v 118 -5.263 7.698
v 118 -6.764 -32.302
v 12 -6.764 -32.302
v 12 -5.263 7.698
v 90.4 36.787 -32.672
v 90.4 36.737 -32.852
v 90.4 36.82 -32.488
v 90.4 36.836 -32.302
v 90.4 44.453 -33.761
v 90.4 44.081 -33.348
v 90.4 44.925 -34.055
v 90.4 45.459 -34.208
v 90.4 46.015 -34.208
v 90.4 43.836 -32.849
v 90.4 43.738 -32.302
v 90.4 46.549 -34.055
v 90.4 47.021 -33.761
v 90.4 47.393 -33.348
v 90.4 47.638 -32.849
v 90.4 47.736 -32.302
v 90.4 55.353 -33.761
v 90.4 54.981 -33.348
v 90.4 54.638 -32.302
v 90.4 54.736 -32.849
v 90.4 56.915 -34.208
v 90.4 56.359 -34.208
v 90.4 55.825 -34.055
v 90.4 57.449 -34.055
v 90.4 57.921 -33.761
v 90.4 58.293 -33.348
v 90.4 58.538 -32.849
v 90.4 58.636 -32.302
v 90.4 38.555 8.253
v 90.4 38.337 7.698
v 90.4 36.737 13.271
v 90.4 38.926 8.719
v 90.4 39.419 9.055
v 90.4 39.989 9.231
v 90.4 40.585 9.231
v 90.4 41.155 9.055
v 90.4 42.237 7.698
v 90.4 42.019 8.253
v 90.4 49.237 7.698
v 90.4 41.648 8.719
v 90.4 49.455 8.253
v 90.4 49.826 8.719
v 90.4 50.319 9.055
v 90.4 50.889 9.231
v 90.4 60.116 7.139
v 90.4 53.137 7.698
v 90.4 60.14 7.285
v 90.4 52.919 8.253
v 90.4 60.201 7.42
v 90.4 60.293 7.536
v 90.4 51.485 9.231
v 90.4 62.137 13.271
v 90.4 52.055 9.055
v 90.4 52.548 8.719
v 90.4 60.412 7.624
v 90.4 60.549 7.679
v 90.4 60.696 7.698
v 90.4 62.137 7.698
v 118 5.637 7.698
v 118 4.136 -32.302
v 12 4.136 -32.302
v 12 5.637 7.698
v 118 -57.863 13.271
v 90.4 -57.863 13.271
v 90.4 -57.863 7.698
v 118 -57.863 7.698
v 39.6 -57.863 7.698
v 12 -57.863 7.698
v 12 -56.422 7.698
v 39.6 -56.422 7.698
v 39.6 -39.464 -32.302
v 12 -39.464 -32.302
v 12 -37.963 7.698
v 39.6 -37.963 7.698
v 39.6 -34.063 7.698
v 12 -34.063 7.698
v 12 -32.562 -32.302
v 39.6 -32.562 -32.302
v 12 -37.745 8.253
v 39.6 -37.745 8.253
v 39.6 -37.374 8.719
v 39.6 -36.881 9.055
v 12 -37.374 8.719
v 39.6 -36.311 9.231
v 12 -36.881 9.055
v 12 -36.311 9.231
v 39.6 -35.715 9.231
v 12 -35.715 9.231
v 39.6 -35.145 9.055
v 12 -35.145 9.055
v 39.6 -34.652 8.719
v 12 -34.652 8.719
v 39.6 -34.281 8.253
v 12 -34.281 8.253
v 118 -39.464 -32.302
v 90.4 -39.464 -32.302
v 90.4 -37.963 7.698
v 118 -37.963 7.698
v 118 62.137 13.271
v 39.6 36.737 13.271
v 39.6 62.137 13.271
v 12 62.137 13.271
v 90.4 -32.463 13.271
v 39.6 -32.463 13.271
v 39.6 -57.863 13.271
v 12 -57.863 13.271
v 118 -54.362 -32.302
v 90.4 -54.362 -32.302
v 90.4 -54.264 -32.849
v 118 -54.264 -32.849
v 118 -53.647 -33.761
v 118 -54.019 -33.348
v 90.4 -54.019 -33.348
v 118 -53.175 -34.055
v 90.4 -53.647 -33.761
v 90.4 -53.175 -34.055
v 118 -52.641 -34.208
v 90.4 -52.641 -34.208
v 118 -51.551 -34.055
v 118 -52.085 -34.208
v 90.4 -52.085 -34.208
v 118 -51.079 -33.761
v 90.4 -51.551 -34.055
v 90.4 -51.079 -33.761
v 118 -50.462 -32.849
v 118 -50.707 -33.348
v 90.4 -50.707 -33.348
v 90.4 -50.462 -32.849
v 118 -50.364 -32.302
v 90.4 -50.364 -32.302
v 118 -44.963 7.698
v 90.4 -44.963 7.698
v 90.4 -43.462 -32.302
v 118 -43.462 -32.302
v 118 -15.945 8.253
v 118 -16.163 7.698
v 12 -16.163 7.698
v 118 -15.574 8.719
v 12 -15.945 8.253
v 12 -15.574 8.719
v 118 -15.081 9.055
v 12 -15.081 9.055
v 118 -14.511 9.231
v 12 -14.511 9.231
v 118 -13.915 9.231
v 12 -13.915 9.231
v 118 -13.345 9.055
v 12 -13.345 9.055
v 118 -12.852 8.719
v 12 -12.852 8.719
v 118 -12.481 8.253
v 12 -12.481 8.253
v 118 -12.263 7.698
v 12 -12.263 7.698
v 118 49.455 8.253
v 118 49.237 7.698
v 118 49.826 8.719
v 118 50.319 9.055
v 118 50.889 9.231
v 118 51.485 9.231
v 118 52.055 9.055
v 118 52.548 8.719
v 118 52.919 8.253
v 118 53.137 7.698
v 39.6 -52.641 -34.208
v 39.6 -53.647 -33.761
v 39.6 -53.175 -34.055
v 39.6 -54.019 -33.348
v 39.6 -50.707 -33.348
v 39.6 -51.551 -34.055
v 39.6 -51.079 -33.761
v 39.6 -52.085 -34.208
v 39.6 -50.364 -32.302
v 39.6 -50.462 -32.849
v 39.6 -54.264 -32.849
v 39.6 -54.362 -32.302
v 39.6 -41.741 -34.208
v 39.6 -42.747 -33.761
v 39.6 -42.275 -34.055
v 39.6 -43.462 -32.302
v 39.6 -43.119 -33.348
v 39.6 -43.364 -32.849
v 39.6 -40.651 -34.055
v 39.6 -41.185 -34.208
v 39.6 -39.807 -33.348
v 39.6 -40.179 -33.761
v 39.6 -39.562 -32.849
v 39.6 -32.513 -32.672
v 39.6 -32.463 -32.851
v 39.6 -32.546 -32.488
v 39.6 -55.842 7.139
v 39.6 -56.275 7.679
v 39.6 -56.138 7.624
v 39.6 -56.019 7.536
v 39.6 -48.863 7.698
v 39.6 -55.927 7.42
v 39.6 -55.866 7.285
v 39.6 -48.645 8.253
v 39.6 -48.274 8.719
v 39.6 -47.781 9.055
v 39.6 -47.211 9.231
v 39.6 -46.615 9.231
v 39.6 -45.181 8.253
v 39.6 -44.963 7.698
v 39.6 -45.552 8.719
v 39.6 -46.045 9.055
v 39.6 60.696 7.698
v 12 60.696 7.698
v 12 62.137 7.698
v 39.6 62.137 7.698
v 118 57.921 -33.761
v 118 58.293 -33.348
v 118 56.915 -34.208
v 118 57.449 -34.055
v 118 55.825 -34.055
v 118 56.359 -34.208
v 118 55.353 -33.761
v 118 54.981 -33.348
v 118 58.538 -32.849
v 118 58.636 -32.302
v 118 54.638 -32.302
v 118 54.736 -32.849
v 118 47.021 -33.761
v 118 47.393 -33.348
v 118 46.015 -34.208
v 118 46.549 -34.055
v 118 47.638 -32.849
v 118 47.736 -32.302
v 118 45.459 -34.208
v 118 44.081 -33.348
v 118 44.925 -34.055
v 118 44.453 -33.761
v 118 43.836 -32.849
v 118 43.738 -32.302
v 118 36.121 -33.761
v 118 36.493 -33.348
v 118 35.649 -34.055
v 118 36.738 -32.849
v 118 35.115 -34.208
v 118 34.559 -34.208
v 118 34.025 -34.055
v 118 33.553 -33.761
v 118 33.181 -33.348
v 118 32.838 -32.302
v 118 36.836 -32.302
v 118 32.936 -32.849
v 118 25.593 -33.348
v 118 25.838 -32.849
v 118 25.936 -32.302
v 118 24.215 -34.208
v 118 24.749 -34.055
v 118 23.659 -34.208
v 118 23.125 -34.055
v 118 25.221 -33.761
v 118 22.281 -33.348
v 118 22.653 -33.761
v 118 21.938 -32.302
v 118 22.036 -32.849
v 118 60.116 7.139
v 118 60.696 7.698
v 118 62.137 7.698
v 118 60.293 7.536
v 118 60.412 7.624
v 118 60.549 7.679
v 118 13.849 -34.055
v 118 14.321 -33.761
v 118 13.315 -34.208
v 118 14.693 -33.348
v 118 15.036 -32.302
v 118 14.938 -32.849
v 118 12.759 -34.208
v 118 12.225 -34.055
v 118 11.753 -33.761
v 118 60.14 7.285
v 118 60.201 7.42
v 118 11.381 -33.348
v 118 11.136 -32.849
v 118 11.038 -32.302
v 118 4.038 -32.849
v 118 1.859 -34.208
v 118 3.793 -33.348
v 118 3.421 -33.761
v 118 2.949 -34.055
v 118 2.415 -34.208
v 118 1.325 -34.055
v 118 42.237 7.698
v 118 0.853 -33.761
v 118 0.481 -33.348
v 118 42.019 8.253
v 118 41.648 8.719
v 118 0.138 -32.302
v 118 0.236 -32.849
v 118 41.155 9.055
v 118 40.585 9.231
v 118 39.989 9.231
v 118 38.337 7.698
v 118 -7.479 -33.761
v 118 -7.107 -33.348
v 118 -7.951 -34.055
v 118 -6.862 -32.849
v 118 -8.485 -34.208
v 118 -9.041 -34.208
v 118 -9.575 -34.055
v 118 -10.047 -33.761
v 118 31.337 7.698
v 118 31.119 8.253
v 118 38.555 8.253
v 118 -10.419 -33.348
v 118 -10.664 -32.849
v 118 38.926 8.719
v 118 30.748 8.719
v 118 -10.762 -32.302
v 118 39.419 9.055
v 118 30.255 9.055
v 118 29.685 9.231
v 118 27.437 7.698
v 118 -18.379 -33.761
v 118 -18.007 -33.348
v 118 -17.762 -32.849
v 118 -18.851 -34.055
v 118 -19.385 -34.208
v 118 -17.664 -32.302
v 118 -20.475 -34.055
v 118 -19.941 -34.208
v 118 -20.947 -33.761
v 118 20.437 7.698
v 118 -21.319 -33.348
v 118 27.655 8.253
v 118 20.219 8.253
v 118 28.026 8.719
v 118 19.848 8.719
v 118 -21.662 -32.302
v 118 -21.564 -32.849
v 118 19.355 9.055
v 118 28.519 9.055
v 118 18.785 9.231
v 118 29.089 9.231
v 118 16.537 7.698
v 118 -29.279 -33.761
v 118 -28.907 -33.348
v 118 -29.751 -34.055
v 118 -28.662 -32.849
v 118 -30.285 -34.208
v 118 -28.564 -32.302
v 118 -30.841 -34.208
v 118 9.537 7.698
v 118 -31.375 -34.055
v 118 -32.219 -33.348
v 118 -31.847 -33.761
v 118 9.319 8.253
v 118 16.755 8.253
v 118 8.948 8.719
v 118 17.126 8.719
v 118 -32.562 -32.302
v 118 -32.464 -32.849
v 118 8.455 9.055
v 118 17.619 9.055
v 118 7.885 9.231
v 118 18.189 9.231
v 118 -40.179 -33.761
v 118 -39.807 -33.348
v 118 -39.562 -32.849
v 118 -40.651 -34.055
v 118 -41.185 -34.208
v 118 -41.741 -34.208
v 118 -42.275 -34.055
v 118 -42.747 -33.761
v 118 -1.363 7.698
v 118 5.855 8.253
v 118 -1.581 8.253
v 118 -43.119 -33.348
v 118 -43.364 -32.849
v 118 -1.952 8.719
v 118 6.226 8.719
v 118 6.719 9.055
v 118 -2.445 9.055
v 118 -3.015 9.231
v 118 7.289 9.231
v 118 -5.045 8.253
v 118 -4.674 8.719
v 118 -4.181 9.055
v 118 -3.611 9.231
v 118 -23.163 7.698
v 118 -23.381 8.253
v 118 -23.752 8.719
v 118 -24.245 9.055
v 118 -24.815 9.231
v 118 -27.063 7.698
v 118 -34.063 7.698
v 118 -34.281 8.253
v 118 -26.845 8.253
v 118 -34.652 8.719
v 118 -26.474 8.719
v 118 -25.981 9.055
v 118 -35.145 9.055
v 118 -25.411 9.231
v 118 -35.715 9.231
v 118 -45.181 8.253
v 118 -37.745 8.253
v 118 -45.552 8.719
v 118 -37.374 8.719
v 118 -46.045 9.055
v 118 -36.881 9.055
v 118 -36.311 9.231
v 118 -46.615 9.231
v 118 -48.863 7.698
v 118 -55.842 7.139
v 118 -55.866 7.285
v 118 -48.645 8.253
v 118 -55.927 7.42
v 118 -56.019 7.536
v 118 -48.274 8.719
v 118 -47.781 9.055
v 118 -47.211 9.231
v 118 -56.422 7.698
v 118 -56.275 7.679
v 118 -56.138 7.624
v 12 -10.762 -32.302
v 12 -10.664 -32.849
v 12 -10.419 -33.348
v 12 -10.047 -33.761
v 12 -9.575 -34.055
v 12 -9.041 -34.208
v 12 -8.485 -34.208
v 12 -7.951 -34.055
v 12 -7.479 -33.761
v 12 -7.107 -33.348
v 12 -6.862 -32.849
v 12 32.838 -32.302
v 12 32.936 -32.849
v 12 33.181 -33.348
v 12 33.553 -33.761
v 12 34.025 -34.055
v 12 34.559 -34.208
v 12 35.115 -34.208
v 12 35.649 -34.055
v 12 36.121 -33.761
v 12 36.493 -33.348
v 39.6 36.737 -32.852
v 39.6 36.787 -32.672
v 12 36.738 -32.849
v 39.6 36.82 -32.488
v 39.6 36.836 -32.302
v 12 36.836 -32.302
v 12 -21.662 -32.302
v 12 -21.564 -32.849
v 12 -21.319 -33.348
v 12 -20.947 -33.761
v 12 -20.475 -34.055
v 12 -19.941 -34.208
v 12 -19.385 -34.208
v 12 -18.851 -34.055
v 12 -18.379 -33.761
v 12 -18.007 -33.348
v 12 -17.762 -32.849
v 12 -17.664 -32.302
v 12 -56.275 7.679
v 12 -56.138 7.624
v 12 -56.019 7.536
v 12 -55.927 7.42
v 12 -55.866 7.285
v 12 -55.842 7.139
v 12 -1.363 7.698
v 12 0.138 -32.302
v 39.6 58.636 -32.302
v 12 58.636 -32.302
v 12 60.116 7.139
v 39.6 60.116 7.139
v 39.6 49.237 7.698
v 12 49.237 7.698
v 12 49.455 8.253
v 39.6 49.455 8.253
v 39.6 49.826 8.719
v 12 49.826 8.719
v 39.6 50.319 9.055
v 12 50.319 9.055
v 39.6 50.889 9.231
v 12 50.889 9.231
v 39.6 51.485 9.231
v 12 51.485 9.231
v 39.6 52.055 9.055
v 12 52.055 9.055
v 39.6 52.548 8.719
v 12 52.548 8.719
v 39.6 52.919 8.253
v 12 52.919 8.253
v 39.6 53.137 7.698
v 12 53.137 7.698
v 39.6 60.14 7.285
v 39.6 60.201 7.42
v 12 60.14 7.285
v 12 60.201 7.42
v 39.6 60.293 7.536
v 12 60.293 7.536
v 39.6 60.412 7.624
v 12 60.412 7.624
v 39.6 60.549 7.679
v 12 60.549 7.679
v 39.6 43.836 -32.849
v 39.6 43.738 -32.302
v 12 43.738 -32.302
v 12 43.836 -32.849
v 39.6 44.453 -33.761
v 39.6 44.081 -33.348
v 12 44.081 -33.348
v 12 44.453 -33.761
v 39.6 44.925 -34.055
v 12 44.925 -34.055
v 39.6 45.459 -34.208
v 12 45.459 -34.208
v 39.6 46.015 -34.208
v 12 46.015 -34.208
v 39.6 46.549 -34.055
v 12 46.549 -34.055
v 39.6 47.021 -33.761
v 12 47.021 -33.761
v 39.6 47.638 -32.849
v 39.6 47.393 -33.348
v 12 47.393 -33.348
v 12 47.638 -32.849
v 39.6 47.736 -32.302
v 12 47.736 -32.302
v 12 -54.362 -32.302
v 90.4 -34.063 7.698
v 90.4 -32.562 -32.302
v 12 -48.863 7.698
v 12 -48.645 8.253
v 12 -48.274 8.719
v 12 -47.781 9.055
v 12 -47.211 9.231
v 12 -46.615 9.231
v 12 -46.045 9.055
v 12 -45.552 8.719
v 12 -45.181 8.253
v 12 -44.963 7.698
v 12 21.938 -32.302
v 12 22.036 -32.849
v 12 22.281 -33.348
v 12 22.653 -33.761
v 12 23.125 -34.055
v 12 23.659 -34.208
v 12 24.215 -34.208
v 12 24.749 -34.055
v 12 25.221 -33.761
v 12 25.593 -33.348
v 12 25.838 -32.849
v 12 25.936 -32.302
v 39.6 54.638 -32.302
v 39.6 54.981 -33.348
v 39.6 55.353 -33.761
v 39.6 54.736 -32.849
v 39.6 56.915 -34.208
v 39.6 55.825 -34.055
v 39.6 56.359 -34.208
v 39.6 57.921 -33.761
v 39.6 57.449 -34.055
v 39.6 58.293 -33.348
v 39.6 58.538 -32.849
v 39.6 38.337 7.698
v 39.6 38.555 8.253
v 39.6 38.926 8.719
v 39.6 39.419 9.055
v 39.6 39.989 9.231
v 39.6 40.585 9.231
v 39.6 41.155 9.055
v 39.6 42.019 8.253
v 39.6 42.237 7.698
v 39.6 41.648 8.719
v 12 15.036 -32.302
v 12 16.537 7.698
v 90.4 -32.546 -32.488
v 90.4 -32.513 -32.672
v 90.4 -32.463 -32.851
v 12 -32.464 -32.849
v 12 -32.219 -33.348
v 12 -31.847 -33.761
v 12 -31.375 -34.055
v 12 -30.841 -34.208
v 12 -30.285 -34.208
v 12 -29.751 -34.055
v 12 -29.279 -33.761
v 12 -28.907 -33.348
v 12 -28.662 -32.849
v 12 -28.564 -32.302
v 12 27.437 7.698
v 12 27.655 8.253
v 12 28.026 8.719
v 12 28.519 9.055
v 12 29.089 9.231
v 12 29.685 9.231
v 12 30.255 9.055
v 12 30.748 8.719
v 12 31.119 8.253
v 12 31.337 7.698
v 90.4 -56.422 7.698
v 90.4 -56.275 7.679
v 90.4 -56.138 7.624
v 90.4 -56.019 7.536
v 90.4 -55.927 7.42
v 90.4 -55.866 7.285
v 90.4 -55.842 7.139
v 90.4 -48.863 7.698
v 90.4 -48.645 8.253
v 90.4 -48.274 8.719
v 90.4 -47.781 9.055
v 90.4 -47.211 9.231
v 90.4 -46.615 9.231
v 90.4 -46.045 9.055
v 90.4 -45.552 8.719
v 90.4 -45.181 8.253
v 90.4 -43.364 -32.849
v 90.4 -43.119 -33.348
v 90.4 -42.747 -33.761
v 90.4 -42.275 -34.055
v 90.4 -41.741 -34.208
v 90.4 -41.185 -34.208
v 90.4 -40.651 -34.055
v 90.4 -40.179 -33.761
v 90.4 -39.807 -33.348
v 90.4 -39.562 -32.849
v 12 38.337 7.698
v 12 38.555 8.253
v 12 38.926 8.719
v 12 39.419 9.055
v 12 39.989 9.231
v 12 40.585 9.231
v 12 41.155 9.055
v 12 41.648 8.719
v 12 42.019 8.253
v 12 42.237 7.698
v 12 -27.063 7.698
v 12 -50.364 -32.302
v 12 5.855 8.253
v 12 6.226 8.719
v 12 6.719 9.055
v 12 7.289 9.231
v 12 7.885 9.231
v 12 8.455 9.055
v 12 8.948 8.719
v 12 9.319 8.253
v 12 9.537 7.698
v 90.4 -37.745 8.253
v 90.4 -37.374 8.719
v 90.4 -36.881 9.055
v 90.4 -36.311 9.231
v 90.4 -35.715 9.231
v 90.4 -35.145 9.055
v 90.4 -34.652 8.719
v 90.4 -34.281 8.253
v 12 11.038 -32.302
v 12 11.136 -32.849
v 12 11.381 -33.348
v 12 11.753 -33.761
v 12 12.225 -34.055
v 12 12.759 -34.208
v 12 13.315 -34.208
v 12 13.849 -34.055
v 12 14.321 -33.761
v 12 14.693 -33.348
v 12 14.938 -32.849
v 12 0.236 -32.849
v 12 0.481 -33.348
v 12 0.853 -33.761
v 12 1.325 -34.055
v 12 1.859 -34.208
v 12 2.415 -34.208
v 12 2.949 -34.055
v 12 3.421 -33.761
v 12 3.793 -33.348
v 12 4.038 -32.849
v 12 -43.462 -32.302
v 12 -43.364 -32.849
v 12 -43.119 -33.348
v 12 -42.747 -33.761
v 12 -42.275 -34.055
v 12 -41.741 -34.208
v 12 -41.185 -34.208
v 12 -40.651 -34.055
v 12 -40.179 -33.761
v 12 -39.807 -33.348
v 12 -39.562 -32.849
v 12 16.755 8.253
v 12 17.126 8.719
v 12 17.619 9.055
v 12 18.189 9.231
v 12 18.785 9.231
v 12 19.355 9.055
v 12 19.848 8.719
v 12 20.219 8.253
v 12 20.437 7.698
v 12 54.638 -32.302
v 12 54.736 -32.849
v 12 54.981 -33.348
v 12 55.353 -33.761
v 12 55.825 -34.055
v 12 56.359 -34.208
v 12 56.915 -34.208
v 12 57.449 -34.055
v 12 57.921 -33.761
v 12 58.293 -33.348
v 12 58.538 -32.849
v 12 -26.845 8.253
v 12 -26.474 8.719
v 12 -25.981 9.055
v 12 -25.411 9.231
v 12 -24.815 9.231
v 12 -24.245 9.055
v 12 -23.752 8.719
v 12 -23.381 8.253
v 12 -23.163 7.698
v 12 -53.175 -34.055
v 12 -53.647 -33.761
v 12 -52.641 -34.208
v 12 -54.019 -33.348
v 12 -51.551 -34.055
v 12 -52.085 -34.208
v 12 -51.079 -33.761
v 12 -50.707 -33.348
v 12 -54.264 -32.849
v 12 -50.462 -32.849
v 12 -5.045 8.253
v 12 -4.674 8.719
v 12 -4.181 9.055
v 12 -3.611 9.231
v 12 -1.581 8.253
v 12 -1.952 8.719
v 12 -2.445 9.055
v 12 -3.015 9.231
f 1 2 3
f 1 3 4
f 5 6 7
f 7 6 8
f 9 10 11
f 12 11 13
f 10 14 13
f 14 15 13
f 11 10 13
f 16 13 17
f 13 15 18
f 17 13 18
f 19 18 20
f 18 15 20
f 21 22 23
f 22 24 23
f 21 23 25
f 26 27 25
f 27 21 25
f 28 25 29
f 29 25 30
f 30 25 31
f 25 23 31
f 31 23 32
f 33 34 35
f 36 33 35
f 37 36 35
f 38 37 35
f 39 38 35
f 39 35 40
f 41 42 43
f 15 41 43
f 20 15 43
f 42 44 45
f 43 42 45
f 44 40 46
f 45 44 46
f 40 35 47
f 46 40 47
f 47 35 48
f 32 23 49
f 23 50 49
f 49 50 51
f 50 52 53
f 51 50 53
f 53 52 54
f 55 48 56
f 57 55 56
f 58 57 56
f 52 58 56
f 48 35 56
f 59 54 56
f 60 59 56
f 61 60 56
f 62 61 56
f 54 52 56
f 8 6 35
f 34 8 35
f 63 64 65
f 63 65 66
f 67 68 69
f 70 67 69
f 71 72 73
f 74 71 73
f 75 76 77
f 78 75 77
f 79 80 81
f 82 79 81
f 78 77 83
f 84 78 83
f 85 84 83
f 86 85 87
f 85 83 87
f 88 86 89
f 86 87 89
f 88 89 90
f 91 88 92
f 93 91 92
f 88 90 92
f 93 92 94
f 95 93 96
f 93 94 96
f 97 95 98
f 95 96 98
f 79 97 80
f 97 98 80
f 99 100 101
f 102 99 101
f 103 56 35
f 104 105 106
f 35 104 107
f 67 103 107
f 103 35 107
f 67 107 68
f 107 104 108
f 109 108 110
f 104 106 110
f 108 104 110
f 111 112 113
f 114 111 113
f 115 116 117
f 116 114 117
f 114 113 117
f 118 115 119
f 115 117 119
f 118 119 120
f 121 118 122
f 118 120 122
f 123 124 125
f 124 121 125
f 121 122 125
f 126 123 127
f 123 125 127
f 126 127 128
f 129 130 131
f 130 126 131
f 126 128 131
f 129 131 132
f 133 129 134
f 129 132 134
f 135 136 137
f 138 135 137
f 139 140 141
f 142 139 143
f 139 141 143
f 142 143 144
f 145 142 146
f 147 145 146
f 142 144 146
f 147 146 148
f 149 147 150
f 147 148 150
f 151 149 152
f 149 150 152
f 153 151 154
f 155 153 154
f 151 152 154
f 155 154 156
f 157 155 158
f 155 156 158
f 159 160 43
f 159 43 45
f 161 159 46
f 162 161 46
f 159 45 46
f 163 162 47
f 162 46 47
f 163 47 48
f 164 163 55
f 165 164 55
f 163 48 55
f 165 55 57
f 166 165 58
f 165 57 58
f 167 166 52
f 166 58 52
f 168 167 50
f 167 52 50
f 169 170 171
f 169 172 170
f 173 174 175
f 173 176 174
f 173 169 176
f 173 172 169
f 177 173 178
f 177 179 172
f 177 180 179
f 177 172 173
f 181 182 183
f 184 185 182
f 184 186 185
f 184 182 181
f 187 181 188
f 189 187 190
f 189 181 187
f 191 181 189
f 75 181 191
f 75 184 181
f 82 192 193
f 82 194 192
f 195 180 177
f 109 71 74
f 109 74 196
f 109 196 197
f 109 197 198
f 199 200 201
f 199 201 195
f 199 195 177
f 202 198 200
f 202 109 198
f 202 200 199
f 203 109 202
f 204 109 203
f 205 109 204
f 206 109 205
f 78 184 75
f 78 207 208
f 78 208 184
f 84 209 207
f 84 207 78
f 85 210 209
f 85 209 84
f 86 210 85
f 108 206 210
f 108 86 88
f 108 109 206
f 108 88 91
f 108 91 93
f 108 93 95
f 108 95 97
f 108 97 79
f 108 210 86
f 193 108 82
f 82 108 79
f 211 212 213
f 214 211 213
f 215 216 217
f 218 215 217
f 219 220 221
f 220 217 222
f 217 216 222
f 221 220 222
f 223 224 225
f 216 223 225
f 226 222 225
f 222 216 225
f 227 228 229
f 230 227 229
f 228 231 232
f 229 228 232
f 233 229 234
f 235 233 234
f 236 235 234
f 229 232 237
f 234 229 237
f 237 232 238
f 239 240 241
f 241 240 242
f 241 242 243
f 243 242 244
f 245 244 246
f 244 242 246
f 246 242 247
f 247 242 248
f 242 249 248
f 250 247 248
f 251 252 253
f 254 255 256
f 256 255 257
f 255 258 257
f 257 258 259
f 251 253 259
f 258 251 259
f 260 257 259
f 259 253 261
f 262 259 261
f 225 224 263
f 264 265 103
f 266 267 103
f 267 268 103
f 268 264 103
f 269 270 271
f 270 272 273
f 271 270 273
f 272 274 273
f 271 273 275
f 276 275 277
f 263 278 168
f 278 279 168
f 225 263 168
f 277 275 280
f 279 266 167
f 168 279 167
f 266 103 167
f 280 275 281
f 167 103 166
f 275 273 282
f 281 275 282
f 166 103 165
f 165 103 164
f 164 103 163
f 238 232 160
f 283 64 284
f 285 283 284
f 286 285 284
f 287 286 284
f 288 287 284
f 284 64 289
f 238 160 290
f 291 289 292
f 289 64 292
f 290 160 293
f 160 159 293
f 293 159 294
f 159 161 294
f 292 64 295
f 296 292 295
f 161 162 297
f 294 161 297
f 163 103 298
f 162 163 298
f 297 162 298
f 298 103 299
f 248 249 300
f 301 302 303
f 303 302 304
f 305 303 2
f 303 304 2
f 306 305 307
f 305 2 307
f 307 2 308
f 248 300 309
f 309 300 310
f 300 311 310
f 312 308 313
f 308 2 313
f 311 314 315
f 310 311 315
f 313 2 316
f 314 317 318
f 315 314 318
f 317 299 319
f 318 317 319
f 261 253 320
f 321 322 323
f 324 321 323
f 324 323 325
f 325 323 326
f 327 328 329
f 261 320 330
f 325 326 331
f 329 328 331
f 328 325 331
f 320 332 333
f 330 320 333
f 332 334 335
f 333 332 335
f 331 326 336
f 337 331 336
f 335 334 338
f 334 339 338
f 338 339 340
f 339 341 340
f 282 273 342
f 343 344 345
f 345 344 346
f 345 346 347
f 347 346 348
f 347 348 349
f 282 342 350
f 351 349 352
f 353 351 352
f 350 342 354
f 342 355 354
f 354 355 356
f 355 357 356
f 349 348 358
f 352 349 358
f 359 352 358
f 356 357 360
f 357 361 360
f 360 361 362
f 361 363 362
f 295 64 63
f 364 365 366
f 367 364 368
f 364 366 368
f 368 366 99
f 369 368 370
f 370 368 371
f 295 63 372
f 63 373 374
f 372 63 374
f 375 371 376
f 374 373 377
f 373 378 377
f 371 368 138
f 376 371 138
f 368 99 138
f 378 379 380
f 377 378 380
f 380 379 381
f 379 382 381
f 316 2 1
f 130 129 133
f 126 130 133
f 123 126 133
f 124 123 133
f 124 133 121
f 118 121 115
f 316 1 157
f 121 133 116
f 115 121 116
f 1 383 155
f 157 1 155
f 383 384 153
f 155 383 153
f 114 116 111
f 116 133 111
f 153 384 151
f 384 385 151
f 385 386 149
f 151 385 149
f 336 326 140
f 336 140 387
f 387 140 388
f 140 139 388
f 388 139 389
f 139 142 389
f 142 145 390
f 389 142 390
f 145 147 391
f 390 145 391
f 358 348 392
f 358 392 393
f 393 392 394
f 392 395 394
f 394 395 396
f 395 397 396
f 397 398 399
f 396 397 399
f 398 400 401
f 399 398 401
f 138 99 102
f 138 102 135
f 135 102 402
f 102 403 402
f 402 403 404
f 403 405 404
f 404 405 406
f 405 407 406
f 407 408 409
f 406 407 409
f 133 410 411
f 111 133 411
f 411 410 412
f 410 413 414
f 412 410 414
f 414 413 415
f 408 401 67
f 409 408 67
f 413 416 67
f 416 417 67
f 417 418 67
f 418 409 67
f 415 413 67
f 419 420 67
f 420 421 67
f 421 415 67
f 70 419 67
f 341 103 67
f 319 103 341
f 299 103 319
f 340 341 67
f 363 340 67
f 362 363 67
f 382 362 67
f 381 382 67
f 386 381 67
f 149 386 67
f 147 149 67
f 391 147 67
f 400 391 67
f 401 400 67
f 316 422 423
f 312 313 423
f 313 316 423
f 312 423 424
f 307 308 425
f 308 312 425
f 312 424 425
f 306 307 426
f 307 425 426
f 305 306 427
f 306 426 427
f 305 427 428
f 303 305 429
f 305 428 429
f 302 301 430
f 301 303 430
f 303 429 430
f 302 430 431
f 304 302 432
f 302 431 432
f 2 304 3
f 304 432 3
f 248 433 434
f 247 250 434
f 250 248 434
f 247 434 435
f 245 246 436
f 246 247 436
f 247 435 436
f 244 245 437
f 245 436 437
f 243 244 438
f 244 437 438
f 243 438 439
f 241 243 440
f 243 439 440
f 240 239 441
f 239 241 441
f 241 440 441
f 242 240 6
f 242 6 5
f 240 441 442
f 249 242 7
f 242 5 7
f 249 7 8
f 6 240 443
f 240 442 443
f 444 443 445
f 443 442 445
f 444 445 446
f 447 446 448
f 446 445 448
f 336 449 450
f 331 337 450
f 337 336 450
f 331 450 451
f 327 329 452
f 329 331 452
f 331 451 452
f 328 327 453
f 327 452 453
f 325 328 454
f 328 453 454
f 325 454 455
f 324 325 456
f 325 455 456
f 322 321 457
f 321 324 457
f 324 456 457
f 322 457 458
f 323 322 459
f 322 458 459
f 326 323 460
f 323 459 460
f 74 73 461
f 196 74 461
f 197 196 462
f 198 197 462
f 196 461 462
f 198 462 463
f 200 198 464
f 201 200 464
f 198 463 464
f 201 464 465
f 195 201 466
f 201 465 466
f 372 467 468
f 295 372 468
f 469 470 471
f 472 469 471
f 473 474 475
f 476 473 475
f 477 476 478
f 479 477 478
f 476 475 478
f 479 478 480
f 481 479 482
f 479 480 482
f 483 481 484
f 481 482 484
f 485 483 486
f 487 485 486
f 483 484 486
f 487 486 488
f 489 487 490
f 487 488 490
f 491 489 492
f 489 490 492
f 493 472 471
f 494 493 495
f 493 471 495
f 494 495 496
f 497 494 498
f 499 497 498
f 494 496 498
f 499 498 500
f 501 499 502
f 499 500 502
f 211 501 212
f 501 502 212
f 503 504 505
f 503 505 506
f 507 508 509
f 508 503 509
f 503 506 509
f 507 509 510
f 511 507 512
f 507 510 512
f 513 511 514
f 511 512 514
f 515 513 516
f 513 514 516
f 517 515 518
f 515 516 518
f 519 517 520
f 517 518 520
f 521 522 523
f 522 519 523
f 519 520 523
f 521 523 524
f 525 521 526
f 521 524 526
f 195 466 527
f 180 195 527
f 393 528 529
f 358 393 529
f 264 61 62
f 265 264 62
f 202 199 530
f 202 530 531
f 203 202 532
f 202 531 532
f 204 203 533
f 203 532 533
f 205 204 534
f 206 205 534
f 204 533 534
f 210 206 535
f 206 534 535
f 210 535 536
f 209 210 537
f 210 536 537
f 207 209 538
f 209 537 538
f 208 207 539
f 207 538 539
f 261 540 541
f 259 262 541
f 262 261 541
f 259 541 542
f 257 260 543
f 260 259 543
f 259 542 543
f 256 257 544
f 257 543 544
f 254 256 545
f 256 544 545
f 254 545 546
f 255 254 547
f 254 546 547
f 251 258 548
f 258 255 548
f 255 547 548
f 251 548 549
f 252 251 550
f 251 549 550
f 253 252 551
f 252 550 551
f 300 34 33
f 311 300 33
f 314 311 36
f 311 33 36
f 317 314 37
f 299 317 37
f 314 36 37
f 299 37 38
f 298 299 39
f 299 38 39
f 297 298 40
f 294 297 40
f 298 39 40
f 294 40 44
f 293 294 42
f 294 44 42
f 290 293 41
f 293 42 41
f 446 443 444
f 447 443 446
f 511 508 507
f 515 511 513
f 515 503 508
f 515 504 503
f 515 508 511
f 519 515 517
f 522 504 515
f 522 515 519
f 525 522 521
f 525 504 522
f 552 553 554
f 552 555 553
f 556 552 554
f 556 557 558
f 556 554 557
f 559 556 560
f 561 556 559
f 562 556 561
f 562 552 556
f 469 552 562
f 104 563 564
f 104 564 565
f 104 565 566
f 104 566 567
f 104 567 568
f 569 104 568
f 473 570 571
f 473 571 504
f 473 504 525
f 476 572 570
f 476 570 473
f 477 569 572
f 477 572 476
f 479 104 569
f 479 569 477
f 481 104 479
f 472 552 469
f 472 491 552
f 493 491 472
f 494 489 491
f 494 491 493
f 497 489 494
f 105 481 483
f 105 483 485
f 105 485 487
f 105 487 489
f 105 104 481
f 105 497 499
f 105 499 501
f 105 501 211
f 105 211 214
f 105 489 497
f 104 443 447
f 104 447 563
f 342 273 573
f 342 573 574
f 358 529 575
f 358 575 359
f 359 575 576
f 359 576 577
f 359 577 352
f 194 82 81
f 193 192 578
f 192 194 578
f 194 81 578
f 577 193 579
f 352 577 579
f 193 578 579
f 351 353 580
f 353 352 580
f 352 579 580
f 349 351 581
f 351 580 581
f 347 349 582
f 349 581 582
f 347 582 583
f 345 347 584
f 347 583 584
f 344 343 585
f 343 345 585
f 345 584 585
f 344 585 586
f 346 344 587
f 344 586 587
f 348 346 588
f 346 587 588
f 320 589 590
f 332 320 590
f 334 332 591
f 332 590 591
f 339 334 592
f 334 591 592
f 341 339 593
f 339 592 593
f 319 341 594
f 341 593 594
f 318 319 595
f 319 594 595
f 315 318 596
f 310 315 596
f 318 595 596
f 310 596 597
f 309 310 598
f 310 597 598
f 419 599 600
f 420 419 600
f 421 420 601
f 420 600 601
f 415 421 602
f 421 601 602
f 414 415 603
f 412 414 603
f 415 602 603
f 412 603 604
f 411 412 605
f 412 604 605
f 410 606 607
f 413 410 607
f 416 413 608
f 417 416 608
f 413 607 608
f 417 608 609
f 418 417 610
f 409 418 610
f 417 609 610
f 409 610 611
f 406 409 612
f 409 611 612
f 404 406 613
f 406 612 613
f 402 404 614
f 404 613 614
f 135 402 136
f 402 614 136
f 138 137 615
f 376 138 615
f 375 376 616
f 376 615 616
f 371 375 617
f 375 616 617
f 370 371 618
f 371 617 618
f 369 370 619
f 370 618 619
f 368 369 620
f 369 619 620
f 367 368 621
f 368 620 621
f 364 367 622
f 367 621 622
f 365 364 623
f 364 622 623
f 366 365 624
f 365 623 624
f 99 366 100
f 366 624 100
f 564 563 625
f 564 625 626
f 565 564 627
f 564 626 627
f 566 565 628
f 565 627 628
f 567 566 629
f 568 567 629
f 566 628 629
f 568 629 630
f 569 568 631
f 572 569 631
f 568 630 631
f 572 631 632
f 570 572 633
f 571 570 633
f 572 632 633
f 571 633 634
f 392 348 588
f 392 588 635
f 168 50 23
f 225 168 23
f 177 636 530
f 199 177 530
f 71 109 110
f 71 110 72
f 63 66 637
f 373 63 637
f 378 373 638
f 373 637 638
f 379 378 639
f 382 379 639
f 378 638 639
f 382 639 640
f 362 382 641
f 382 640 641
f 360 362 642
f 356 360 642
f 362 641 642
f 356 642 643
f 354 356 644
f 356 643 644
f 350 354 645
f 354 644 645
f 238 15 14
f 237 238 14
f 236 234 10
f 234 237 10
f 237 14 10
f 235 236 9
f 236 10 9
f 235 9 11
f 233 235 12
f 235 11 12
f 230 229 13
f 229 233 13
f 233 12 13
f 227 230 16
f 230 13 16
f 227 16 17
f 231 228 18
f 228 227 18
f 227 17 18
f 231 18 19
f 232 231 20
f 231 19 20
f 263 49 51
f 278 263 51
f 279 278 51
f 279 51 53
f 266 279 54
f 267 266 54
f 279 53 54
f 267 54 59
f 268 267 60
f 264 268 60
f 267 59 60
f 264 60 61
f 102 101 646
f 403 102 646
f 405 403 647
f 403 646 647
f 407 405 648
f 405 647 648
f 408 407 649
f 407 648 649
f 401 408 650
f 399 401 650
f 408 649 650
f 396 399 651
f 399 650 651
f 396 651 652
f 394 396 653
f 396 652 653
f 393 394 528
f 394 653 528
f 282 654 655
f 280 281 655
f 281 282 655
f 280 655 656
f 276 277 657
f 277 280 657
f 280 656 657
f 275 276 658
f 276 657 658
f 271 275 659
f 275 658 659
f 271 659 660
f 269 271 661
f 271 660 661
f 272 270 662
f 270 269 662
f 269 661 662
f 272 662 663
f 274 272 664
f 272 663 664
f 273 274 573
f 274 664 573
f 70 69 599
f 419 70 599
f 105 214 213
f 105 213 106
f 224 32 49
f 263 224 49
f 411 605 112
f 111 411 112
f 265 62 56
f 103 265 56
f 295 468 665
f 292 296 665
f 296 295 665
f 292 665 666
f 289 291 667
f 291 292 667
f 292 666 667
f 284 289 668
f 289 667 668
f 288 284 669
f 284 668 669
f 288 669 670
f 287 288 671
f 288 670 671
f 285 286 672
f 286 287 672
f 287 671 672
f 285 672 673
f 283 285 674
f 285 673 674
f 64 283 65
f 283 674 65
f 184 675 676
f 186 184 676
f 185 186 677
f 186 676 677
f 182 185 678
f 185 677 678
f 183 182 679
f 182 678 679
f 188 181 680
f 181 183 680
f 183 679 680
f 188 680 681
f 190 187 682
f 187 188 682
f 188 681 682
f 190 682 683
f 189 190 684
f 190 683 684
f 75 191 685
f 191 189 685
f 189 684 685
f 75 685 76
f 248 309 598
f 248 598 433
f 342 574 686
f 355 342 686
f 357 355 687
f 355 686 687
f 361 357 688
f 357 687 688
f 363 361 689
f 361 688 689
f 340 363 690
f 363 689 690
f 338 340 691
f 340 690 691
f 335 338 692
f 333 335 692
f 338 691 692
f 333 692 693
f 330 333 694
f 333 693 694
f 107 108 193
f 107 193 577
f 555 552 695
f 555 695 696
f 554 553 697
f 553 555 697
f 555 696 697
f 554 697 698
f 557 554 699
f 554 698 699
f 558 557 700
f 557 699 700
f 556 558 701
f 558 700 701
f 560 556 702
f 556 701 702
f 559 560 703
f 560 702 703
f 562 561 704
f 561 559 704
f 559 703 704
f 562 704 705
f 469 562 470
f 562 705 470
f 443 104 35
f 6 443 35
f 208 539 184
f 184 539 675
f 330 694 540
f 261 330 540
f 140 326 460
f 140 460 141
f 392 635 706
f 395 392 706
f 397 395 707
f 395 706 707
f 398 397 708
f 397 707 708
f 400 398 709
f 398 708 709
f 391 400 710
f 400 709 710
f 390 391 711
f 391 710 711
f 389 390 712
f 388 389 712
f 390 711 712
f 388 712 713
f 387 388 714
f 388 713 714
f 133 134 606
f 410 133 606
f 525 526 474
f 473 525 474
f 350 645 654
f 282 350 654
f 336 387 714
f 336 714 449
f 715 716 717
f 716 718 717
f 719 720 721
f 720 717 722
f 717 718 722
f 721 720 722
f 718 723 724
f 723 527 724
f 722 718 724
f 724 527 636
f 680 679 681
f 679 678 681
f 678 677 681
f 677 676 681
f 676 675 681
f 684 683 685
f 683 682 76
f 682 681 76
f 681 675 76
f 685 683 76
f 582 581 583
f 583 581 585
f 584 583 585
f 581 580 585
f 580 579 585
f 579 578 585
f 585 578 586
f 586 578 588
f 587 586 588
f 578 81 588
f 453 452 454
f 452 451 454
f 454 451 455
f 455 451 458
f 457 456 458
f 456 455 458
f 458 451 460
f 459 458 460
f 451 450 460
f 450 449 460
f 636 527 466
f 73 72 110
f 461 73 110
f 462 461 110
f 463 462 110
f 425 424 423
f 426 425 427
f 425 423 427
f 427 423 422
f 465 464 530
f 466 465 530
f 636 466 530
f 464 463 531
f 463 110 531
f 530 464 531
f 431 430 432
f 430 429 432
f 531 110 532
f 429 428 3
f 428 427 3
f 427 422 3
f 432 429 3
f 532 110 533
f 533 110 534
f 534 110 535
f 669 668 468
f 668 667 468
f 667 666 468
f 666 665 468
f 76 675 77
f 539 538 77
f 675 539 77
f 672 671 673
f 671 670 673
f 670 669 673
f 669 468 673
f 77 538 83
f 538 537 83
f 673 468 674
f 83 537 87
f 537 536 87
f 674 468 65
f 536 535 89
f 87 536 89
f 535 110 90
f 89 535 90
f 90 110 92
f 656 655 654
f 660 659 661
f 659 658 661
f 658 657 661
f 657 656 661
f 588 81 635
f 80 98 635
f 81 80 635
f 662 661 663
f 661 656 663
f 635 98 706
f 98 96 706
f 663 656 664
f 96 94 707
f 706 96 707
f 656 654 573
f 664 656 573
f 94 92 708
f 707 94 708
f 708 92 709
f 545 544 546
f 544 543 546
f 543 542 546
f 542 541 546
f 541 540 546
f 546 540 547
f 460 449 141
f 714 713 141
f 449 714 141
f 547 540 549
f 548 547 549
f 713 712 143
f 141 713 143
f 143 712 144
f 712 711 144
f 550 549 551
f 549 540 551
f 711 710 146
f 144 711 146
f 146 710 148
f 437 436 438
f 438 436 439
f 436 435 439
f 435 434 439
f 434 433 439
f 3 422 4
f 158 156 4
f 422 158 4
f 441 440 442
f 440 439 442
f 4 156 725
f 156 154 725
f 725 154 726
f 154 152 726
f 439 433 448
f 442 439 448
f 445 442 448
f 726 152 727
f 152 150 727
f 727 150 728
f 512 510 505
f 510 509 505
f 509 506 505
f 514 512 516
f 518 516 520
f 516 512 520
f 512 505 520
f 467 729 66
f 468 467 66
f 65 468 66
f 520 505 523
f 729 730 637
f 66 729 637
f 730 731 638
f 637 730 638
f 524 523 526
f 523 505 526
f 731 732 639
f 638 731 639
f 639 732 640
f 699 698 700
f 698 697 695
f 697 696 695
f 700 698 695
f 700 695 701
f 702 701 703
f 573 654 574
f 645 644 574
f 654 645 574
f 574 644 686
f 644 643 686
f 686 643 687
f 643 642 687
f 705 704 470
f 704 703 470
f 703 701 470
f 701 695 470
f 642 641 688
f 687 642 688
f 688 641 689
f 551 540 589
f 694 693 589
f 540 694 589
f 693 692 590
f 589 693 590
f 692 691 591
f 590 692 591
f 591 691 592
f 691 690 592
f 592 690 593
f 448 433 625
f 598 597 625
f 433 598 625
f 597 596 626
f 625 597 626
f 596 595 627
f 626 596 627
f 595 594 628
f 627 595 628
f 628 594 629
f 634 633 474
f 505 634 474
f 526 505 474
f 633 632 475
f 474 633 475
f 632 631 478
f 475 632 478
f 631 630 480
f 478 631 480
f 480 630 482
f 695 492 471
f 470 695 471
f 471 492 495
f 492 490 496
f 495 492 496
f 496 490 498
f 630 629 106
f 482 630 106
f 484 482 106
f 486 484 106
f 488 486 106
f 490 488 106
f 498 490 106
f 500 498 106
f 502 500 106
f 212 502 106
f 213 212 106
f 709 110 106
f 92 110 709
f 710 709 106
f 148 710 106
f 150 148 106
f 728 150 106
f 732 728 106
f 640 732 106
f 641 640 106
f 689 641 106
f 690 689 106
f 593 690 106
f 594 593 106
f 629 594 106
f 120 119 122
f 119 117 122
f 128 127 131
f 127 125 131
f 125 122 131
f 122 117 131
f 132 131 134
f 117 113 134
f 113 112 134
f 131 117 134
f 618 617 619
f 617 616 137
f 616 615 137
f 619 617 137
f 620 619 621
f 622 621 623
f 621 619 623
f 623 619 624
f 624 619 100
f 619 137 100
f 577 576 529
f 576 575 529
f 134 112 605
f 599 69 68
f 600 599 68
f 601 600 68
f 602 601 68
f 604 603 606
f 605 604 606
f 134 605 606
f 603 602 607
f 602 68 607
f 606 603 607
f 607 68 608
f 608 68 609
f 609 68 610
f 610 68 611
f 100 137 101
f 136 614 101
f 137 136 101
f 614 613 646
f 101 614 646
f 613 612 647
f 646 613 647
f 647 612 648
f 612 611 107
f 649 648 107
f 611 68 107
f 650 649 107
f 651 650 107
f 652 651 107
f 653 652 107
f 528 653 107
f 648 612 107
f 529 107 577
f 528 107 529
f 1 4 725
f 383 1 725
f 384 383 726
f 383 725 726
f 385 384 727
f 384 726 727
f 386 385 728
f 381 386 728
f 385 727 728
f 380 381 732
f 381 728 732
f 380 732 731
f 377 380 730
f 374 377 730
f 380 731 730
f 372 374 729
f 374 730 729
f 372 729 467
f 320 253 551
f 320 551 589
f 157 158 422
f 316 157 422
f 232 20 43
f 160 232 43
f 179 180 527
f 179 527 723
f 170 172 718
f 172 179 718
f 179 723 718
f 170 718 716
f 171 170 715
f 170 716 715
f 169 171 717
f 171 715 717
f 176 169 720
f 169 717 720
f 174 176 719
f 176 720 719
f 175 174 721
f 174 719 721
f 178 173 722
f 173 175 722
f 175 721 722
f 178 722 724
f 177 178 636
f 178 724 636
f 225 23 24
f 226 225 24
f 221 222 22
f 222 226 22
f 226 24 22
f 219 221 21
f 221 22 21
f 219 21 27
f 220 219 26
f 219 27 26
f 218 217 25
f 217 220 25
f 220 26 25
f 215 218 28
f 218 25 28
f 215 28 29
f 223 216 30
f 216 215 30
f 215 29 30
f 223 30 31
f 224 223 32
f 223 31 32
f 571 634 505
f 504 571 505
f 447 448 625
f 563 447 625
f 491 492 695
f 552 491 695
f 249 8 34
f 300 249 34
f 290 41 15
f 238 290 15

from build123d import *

# Parameters (mm, degrees)
F1_DEPTH = 130
F2_W     = 50.8
F2_H     = 25.4
F3_DEPTH = 79.5
F4_W     = 12
F4_H     = 50.7057624385
F4_H_2   = 69.7820825055
F4_H_3   = 69.8881107867
F4_H_4   = 52.3517530859
F5_DEPTH = 47.4990536315


# Not quite as in the source:
# - ends of sketch curves that miss each other by under 0.0002 mm in the source are joined
# - a feature names something its author has since deleted; it is built from what else it names


with BuildPart() as f1:
    # F0 (on Right) → F1 (new body)
    with BuildSketch(Plane.YZ):
        with BuildLine():
            Line((62.1368927236, 13.271021442), (-57.8631072764, 13.271021442))
            Line((-57.8631072764, 13.271021442), (-57.8631072764, 7.697946392))
            Line((-57.8631072764, 7.697946392), (-56.4219683785, 7.6979366796))
            ThreePointArc((-56.4219683785, 7.6979366796), (-56.0194508606, 7.5356245361), (-55.8421445251, 7.1394791077))
            Line((-55.8421445251, 7.1394791077), (-54.3616227062, -32.302053608))
            ThreePointArc((-54.3616227062, -32.302053608), (-52.3630302548, -34.2270321895), (-50.3644378034, -32.302053608))
            Line((-50.3644378034, -32.302053608), (-48.8631072764, 7.697946392))
            ThreePointArc((-48.8631072764, 7.697946392), (-46.9131019002, 9.2535299318), (-44.9631072764, 7.6979329132))
            Line((-44.9631072764, 7.6979329132), (-43.4616227062, -32.302053608))
            ThreePointArc((-43.4616227062, -32.302053608), (-41.4630302548, -34.2270321895), (-39.4644378034, -32.302053608))
            Line((-39.4644378034, -32.302053608), (-37.9631072764, 7.697946392))
            ThreePointArc((-37.9631072764, 7.697946392), (-36.0131019002, 9.2535299318), (-34.0631072764, 7.6979329132))
            Line((-34.0631072764, 7.6979329132), (-32.5616227062, -32.302053608))
            ThreePointArc((-32.5616227062, -32.302053608), (-30.5630302548, -34.2270321895), (-28.5644378034, -32.302053608))
            Line((-28.5644378034, -32.302053608), (-27.0631072764, 7.697946392))
            ThreePointArc((-27.0631072764, 7.697946392), (-25.1131019002, 9.2535299318), (-23.1631072764, 7.6979329132))
            Line((-23.1631072764, 7.6979329132), (-21.6616227062, -32.302053608))
            ThreePointArc((-21.6616227062, -32.302053608), (-19.6630302548, -34.2270321895), (-17.6644378034, -32.302053608))
            Line((-17.6644378034, -32.302053608), (-16.1631072764, 7.697946392))
            ThreePointArc((-16.1631072764, 7.697946392), (-14.2131019002, 9.2535299318), (-12.2631072764, 7.6979329132))
            Line((-12.2631072764, 7.6979329132), (-10.7616227062, -32.302053608))
            ThreePointArc((-10.7616227062, -32.302053608), (-8.7630302548, -34.2270321895), (-6.7644378034, -32.302053608))
            Line((-6.7644378034, -32.302053608), (-5.2631072764, 7.697946392))
            ThreePointArc((-5.2631072764, 7.697946392), (-3.3131019002, 9.2535299318), (-1.3631072764, 7.6979329132))
            Line((-1.3631072764, 7.6979329132), (0.1383772938, -32.302053608))
            ThreePointArc((0.1383772938, -32.302053608), (2.1369697452, -34.2270321895), (4.1355621966, -32.302053608))
            Line((4.1355621966, -32.302053608), (5.6368927236, 7.697946392))
            ThreePointArc((5.6368927236, 7.697946392), (7.5868980998, 9.2535299318), (9.5368927236, 7.6979329132))
            Line((9.5368927236, 7.6979329132), (11.0383772938, -32.302053608))
            ThreePointArc((11.0383772938, -32.302053608), (13.0369697452, -34.2270321895), (15.0355621966, -32.302053608))
            Line((15.0355621966, -32.302053608), (16.5368927236, 7.697946392))
            ThreePointArc((16.5368927236, 7.697946392), (18.4868980998, 9.2535299318), (20.4368927236, 7.6979329132))
            Line((20.4368927236, 7.6979329132), (21.9383772938, -32.302053608))
            ThreePointArc((21.9383772938, -32.302053608), (23.9369697452, -34.2270321895), (25.9355621966, -32.302053608))
            Line((25.9355621966, -32.302053608), (27.4368927236, 7.697946392))
            ThreePointArc((27.4368927236, 7.697946392), (29.3868980998, 9.2535299318), (31.3368927236, 7.6979329132))
            Line((31.3368927236, 7.6979329132), (32.8383772938, -32.302053608))
            ThreePointArc((32.8383772938, -32.302053608), (34.8369697452, -34.2270321895), (36.8355621966, -32.302053608))
            Line((36.8355621966, -32.302053608), (38.3368927236, 7.697946392))
            ThreePointArc((38.3368927236, 7.697946392), (40.2868980998, 9.2535299318), (42.2368927236, 7.6979329132))
            Line((42.2368927236, 7.6979329132), (43.7383772938, -32.302053608))
            ThreePointArc((43.7383772938, -32.302053608), (45.7369697452, -34.2270321895), (47.7355621966, -32.302053608))
            Line((47.7355621966, -32.302053608), (49.2368927236, 7.697946392))
            ThreePointArc((49.2368927236, 7.697946392), (51.1868980998, 9.2535299318), (53.1368927236, 7.6979329132))
            Line((53.1368927236, 7.6979329132), (54.6383772938, -32.302053608))
            ThreePointArc((54.6383772938, -32.302053608), (56.6369697452, -34.2270321895), (58.6355621966, -32.302053608))
            Line((58.6355621966, -32.302053608), (60.11593154, 7.1394768706))
            ThreePointArc((60.11593154, 7.1394768706), (60.2932371534, 7.5356237596), (60.6957554774, 7.697946392))
            Line((60.6957554774, 7.697946392), (62.1368927236, 7.697946392))
            Line((62.1368927236, 7.697946392), (62.1368927236, 13.271021442))
        make_face()
    extrude(amount=F1_DEPTH)

    # F2 (on face) → F3 (cut)
    with BuildSketch(Plane.XY.offset(13.271021442)):
        with Locations((65, -45.1631072764)):
            Rectangle(F2_W, F2_H)
        with Locations((65, 49.4368927236)):
            Rectangle(F2_W, F2_H)
    extrude(amount=-F3_DEPTH, mode=Mode.SUBTRACT)

    # F4 (on face) → F5 (cut, through all)
    with BuildSketch(Plane.XY.offset(13.271021442)):
        with Locations((6, 36.890672449)):
            Rectangle(F4_W, F4_H)
        with Locations((6, -23.353250023)):
            Rectangle(F4_W, F4_H_2)
        with Locations((124, -23.955682084)):
            Rectangle(F4_W, F4_H_3)
        with Locations((124, 37.1642498523)):
            Rectangle(F4_W, F4_H_4)
    extrude(amount=-F5_DEPTH, mode=Mode.SUBTRACT)


solid = f1.part
